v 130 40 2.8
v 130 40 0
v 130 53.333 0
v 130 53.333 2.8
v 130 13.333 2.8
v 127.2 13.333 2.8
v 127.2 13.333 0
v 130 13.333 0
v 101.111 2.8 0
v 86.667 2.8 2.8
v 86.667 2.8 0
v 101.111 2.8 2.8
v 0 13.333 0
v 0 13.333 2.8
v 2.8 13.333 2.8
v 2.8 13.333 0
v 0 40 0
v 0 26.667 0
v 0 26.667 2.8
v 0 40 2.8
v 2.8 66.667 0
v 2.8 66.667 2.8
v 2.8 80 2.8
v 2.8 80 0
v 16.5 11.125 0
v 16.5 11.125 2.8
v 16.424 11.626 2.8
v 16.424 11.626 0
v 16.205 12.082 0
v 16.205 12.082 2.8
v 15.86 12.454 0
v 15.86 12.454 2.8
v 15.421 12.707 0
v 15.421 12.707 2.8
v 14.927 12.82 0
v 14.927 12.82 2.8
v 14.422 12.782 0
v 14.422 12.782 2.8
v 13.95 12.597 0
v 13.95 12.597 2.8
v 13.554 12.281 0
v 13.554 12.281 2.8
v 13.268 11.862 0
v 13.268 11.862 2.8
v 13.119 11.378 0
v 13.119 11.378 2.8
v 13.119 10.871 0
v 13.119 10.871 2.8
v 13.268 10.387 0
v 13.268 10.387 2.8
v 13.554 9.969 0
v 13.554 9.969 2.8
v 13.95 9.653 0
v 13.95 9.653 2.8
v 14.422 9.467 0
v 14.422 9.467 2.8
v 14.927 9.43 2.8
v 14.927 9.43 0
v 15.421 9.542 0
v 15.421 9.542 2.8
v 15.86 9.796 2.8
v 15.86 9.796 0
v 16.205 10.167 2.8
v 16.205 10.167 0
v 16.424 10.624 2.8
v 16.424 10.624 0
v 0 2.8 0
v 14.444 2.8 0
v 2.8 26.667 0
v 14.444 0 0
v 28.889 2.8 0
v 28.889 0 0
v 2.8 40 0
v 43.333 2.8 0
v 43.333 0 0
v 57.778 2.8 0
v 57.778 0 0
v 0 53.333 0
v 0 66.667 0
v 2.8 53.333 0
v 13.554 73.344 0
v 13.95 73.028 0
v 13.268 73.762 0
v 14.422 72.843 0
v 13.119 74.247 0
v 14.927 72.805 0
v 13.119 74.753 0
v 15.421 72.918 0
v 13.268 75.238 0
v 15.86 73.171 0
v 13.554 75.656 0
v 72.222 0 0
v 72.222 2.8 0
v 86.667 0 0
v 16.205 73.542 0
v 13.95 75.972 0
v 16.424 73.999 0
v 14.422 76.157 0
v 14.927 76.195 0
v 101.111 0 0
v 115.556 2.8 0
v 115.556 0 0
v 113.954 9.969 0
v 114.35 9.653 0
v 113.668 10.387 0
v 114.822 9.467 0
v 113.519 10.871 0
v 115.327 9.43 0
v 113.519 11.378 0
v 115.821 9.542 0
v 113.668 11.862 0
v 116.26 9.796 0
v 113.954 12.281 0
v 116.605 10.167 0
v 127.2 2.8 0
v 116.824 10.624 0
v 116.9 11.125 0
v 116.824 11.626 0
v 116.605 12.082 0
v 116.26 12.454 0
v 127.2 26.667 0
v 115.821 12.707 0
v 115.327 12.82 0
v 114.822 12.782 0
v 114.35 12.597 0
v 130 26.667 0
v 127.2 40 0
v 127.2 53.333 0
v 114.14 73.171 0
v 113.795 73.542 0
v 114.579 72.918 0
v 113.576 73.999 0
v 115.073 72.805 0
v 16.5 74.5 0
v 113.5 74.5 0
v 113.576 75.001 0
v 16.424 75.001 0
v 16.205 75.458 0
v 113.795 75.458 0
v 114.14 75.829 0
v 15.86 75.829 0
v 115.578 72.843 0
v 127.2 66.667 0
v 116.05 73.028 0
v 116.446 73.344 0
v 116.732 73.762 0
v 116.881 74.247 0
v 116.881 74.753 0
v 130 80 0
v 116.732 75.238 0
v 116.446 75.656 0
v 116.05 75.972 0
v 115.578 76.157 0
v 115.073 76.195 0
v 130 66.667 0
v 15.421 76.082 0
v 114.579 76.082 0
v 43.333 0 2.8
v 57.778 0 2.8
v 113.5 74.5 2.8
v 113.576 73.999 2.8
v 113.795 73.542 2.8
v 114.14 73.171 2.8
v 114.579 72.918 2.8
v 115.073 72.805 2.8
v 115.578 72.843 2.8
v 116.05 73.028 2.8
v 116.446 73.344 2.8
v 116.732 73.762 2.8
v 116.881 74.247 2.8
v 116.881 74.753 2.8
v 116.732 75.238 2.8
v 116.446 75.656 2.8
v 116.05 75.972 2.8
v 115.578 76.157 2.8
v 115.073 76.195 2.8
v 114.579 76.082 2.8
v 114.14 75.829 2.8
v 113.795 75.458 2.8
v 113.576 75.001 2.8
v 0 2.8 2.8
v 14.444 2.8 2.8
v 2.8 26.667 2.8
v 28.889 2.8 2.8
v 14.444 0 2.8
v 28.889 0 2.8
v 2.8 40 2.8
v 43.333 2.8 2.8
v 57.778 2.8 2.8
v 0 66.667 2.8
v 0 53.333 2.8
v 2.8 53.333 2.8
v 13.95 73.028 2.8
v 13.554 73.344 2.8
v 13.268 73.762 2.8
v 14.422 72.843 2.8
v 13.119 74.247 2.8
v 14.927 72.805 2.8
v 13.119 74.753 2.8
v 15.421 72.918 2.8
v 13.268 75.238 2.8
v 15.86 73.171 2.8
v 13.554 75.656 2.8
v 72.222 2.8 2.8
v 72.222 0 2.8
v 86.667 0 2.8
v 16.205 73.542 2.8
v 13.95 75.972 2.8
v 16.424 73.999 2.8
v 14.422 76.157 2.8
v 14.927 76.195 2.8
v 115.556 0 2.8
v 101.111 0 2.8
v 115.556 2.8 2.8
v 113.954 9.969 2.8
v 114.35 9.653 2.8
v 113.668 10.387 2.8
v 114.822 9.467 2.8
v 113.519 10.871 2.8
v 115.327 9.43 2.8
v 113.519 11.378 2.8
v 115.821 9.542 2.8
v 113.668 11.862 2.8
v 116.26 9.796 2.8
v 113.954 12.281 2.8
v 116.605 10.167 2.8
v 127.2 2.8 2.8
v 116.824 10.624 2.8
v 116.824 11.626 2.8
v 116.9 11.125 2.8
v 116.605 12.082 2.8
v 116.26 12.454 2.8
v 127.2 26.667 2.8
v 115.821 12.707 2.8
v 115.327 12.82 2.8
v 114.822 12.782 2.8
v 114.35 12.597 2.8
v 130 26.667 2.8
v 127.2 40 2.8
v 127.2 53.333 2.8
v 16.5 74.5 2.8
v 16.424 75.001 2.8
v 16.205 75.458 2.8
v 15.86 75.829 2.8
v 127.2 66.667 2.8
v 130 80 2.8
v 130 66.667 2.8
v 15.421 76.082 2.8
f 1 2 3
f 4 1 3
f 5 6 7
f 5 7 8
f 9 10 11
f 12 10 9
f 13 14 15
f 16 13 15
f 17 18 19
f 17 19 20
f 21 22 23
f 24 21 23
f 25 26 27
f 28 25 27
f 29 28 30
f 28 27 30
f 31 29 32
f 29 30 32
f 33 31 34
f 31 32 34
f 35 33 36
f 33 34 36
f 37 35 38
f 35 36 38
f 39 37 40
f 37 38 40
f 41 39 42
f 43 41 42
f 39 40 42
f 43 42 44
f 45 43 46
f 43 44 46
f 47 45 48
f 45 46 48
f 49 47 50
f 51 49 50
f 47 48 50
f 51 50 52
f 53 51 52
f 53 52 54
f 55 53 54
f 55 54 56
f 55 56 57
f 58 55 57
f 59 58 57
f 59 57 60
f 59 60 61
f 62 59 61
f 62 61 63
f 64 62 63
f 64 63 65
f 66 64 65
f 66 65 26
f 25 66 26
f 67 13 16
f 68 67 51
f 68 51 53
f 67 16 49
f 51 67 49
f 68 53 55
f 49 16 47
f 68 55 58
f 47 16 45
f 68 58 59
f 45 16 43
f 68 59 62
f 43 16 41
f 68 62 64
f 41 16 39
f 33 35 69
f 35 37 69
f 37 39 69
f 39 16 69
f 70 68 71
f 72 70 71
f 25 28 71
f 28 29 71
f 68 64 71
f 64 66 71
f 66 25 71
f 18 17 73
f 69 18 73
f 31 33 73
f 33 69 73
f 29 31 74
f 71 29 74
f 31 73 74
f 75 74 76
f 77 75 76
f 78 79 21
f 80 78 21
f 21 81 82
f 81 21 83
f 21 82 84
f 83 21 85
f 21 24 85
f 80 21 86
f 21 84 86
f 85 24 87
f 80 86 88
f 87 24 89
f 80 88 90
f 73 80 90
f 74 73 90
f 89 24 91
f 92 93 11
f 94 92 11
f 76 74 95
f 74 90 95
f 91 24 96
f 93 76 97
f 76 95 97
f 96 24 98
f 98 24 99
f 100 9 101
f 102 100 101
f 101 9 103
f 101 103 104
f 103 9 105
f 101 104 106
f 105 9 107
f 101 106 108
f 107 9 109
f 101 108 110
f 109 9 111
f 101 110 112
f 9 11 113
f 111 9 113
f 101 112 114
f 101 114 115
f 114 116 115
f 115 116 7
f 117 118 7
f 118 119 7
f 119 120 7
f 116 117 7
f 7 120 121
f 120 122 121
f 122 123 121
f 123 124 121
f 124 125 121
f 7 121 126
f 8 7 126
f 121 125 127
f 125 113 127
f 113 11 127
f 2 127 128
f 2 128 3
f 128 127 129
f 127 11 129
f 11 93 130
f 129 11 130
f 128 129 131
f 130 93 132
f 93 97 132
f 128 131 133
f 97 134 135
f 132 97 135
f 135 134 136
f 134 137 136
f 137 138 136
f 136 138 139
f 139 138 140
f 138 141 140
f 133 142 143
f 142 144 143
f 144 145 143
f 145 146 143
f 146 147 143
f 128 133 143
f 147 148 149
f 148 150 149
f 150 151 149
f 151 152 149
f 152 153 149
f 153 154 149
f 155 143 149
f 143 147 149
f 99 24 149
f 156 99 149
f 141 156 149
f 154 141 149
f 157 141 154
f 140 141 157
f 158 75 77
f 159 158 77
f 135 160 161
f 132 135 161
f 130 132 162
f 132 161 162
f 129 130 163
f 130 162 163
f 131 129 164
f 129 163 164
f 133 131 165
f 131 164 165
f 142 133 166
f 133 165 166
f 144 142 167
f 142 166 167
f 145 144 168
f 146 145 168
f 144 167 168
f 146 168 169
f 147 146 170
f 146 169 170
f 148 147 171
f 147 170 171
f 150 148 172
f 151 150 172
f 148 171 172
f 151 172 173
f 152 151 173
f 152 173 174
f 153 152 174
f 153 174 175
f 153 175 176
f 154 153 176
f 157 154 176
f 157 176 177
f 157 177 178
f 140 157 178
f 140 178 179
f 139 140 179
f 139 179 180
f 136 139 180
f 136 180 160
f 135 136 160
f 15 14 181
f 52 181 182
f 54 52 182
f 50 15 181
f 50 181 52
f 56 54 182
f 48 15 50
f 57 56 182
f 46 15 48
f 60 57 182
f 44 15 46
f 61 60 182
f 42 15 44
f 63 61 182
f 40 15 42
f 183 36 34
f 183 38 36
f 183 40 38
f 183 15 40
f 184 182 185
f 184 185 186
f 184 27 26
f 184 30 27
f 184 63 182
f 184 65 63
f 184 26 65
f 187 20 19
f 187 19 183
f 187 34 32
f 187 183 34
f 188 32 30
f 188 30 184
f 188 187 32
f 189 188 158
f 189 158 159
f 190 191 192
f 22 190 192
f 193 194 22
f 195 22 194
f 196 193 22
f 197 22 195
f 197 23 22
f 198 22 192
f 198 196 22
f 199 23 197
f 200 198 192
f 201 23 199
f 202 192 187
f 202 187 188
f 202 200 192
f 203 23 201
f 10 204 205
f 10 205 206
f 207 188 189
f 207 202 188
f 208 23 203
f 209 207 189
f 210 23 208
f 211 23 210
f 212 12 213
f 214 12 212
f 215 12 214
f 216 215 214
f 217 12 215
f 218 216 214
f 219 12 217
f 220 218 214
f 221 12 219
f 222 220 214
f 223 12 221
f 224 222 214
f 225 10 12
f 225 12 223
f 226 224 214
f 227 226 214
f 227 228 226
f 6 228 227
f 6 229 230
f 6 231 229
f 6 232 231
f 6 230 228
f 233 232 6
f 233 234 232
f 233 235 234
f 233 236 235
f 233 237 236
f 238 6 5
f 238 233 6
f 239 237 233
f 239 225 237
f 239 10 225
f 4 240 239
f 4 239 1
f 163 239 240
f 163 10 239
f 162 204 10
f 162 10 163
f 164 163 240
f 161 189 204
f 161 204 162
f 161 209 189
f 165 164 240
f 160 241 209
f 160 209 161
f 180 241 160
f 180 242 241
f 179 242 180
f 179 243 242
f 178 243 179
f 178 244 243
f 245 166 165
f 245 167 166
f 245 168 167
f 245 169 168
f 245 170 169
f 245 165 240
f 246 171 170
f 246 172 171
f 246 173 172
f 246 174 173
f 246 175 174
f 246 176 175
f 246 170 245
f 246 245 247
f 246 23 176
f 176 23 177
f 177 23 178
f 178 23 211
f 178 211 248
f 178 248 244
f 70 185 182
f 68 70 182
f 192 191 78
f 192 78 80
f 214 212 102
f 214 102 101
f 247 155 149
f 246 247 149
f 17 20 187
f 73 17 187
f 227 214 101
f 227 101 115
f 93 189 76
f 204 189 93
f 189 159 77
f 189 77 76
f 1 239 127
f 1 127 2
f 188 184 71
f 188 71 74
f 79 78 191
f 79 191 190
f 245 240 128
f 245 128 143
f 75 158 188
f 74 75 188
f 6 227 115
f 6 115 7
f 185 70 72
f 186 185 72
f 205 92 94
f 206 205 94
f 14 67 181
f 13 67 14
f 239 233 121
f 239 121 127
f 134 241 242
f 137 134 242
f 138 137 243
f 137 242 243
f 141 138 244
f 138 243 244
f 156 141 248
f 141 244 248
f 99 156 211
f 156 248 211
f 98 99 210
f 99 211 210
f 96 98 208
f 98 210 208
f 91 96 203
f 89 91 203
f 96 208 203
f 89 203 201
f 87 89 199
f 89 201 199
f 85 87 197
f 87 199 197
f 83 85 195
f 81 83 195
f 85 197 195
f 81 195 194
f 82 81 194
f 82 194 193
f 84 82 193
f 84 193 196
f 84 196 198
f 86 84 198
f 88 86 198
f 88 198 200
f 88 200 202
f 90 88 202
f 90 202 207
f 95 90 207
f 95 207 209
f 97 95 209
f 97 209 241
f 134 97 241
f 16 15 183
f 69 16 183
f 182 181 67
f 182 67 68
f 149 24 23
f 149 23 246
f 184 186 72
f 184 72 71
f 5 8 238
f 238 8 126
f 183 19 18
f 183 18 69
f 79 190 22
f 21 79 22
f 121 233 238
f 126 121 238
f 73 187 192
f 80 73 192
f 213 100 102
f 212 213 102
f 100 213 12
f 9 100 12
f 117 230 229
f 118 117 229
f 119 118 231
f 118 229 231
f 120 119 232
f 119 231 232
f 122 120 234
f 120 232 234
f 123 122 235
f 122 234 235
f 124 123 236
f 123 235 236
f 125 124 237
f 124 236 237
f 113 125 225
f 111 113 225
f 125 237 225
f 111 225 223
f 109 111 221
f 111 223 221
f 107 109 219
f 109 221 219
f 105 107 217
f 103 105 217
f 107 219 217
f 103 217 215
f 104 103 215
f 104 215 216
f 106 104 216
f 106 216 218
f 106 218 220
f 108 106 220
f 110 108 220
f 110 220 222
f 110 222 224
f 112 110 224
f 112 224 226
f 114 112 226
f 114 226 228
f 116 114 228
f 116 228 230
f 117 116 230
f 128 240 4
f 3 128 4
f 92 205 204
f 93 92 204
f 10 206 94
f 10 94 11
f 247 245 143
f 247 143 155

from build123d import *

# Parameters (mm, degrees)
SKETCH1_W           = 130
SKETCH1_H           = 80
BOSS_EXTRUDE1_DEPTH = 2.8
SKETCH2_W           = 14.444444444
SKETCH2_H           = 2.8
SKETCH2_W_2         = 2.8
SKETCH2_H_2         = 13.333333334
SKETCH2_H_3         = 13.333333333
CUT_EXTRUDE1_DEPTH  = 153.669053839
CUT_EXTRUDE2_REACH  = 154.669
SKETCH3_R           = 1.7


with BuildPart() as part:
    # Sketch1 → Boss-Extrude1 (new body)
    with BuildSketch(Plane.XY):
        with Locations((65, 40)):
            Rectangle(SKETCH1_W, SKETCH1_H)
    extrude(amount=BOSS_EXTRUDE1_DEPTH)

    # Sketch2 → Cut-Extrude1 (cut, through all)
    with BuildSketch(Plane.XY.offset(2.8)):
        with Locations((7.222222222, 1.4)):
            Rectangle(SKETCH2_W, SKETCH2_H)
        with Locations((36.111111111, 1.4)):
            Rectangle(SKETCH2_W, SKETCH2_H)
        with Locations((65, 1.4)):
            Rectangle(SKETCH2_W, SKETCH2_H)
        with Locations((93.888888889, 1.4)):
            Rectangle(SKETCH2_W, SKETCH2_H)
        Polygon((115.555555556, 0), (115.555555556, 2.8), (127.2, 2.8), (127.2, 13.333333333), (130, 13.333333333), (130, 0), align=None)
        with Locations((1.4, 20)):
            Rectangle(SKETCH2_W_2, SKETCH2_H_2)
        with Locations((1.4, 46.666666667)):
            Rectangle(SKETCH2_W_2, SKETCH2_H_3)
        with Locations((1.4, 73.333333334)):
            Rectangle(SKETCH2_W_2, SKETCH2_H_3)
        with Locations((128.6, 33.333333334)):
            Rectangle(SKETCH2_W_2, SKETCH2_H_3)
        with Locations((128.6, 60)):
            Rectangle(SKETCH2_W_2, SKETCH2_H_2)
    extrude(amount=-CUT_EXTRUDE1_DEPTH, mode=Mode.SUBTRACT)

    # Sketch3 → Cut-Extrude2 (cut, up to next)
    with BuildSketch(Plane.XY.offset(2.8), mode=Mode.PRIVATE) as cut_extrude2_sk1:
        with Locations((14.8, 74.5)):
            Circle(SKETCH3_R)
    cut_extrude2_tool1 = extrude(cut_extrude2_sk1.sketch, amount=-CUT_EXTRUDE2_REACH, mode=Mode.PRIVATE) & part.part
    # Sketch3 → Cut-Extrude2 (cut, up to next)
    with BuildSketch(Plane.XY.offset(2.8), mode=Mode.PRIVATE) as cut_extrude2_sk2:
        with Locations(Location((115.2, 74.5, 0), (0, 0, 180))):
            Circle(SKETCH3_R)
    cut_extrude2_tool2 = extrude(cut_extrude2_sk2.sketch, amount=-CUT_EXTRUDE2_REACH, mode=Mode.PRIVATE) & part.part
    # Sketch3 → Cut-Extrude2 (cut, up to next)
    with BuildSketch(Plane.XY.offset(2.8), mode=Mode.PRIVATE) as cut_extrude2_sk3:
        with Locations((14.8, 11.124824394)):
            Circle(SKETCH3_R)
    cut_extrude2_tool3 = extrude(cut_extrude2_sk3.sketch, amount=-CUT_EXTRUDE2_REACH, mode=Mode.PRIVATE) & part.part
    # Sketch3 → Cut-Extrude2 (cut, up to next)
    with BuildSketch(Plane.XY.offset(2.8), mode=Mode.PRIVATE) as cut_extrude2_sk4:
        with Locations((115.2, 11.124824394)):
            Circle(SKETCH3_R)
    cut_extrude2_tool4 = extrude(cut_extrude2_sk4.sketch, amount=-CUT_EXTRUDE2_REACH, mode=Mode.PRIVATE) & part.part
    add(cut_extrude2_tool1.solids().sort_by_distance((14.8, 74.5, 2.8))[0], mode=Mode.SUBTRACT)
    add(cut_extrude2_tool2.solids().sort_by_distance((115.2, 74.5, 2.8))[0], mode=Mode.SUBTRACT)
    add(cut_extrude2_tool3.solids().sort_by_distance((14.8, 11.124824, 2.8))[0], mode=Mode.SUBTRACT)
    add(cut_extrude2_tool4.solids().sort_by_distance((115.2, 11.124824, 2.8))[0], mode=Mode.SUBTRACT)


solid = part.part
